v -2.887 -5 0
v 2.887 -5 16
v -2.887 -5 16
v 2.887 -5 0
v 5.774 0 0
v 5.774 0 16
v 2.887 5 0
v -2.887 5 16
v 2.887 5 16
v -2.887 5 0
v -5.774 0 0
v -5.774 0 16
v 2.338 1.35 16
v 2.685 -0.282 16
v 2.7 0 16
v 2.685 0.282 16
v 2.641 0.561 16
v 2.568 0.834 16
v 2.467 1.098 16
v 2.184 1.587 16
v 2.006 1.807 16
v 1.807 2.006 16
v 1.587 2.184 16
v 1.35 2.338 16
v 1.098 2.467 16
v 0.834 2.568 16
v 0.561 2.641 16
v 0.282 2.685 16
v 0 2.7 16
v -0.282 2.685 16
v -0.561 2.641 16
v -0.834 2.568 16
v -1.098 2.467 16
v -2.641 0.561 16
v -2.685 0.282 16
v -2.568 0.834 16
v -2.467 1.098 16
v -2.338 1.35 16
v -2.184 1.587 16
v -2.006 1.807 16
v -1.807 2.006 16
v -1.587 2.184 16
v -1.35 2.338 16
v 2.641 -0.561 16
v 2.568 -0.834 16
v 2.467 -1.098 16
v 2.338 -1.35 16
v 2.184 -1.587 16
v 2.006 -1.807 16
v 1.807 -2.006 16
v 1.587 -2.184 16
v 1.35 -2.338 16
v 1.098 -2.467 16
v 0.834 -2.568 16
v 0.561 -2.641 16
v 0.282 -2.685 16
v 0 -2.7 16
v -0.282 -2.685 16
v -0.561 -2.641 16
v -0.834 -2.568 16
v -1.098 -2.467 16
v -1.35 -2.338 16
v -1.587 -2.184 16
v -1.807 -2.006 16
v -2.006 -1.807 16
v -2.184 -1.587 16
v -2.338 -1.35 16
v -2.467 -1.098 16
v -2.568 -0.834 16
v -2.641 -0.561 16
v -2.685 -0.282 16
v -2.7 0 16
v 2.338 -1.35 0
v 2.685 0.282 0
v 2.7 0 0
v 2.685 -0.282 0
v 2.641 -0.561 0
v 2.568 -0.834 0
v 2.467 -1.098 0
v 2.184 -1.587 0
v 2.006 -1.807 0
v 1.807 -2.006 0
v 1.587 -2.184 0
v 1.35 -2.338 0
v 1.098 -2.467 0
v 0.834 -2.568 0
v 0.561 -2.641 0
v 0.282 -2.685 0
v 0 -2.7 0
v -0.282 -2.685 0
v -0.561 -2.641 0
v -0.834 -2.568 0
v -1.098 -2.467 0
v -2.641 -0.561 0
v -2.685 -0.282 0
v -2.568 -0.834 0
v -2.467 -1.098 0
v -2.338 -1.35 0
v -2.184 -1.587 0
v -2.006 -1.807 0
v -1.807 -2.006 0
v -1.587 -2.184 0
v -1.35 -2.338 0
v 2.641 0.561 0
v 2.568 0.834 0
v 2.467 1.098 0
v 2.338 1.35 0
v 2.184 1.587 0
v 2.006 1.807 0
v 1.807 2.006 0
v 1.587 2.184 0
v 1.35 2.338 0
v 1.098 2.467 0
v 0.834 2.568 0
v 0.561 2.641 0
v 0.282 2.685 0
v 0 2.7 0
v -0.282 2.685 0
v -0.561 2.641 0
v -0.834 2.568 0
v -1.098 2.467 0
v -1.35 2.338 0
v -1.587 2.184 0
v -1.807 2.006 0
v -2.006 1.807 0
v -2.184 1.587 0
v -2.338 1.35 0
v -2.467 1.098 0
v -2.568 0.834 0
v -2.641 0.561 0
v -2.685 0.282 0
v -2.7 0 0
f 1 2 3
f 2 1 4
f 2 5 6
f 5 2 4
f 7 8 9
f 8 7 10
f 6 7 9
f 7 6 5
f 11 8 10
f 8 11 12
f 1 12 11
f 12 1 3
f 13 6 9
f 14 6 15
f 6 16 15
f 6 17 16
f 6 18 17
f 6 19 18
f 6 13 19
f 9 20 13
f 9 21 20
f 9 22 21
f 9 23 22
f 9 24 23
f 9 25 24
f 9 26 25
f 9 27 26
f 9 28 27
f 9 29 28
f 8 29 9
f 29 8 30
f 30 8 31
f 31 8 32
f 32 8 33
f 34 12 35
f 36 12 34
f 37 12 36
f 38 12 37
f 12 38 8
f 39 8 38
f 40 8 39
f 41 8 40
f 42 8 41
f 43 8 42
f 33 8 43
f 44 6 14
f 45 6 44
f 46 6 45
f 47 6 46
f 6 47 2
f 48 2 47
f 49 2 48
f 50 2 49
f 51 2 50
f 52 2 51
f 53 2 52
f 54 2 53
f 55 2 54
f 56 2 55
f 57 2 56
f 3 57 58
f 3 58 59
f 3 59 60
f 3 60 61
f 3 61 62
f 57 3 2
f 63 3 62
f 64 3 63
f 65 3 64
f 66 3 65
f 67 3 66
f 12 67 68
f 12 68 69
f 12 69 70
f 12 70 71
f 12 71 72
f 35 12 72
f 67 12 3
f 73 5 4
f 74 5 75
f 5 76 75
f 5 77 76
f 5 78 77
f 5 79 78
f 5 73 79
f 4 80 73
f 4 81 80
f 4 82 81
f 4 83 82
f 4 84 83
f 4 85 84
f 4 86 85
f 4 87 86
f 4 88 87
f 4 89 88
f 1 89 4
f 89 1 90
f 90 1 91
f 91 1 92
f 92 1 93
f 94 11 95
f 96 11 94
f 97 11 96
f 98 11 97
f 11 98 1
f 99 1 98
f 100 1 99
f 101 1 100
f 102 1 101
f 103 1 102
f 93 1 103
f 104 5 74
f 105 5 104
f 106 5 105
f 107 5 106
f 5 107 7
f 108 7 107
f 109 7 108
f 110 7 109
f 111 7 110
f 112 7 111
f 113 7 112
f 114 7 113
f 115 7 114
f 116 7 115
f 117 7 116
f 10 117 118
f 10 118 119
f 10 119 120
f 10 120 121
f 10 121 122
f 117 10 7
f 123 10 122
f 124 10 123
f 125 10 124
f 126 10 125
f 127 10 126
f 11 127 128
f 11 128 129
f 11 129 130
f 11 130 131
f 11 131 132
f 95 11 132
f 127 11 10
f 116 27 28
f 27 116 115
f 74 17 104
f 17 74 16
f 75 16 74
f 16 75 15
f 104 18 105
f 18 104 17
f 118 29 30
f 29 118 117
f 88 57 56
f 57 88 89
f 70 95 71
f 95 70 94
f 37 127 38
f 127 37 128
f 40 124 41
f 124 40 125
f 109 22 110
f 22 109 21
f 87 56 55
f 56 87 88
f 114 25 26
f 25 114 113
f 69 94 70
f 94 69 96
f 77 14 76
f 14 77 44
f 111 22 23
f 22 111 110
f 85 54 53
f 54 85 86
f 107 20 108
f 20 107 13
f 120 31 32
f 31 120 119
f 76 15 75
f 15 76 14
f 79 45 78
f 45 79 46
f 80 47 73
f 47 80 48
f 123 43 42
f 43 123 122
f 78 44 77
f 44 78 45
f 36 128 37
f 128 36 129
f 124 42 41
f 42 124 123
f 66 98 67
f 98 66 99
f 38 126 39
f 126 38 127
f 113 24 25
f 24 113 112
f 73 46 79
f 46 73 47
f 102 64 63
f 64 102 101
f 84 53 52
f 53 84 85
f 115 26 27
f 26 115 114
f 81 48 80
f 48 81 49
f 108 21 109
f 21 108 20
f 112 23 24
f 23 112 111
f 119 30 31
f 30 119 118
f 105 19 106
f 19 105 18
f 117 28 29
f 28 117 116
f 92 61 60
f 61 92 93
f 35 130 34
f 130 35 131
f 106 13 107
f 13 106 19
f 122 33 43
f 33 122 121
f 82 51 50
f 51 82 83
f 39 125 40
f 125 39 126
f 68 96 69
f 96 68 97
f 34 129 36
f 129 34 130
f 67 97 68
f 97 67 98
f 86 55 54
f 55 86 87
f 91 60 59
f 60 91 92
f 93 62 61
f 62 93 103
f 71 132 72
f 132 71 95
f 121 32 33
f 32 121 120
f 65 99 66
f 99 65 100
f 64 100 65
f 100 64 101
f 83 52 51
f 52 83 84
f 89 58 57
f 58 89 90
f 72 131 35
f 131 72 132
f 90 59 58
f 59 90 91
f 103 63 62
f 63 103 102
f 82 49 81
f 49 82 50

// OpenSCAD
// Hex standoff, 16 mm long.
$fn = 60;
eps = 0.02;
thread_d = 5.4;
flat = 10;
length = 16;
chamfer = 1.2;
difference() {
    union() {
        cylinder(d = flat / cos(30), h = length, $fn = 6);
        cylinder(d1 = flat / cos(30) - 2 * chamfer, d2 = flat / cos(30), h = chamfer, $fn = 6);
        translate([0, 0, length - chamfer]) cylinder(d1 = flat / cos(30), d2 = flat / cos(30) - 2 * chamfer, h = chamfer, $fn = 6);
    }
    translate([0, 0, -eps]) cylinder(d = thread_d, h = length + 2 * eps);
}
